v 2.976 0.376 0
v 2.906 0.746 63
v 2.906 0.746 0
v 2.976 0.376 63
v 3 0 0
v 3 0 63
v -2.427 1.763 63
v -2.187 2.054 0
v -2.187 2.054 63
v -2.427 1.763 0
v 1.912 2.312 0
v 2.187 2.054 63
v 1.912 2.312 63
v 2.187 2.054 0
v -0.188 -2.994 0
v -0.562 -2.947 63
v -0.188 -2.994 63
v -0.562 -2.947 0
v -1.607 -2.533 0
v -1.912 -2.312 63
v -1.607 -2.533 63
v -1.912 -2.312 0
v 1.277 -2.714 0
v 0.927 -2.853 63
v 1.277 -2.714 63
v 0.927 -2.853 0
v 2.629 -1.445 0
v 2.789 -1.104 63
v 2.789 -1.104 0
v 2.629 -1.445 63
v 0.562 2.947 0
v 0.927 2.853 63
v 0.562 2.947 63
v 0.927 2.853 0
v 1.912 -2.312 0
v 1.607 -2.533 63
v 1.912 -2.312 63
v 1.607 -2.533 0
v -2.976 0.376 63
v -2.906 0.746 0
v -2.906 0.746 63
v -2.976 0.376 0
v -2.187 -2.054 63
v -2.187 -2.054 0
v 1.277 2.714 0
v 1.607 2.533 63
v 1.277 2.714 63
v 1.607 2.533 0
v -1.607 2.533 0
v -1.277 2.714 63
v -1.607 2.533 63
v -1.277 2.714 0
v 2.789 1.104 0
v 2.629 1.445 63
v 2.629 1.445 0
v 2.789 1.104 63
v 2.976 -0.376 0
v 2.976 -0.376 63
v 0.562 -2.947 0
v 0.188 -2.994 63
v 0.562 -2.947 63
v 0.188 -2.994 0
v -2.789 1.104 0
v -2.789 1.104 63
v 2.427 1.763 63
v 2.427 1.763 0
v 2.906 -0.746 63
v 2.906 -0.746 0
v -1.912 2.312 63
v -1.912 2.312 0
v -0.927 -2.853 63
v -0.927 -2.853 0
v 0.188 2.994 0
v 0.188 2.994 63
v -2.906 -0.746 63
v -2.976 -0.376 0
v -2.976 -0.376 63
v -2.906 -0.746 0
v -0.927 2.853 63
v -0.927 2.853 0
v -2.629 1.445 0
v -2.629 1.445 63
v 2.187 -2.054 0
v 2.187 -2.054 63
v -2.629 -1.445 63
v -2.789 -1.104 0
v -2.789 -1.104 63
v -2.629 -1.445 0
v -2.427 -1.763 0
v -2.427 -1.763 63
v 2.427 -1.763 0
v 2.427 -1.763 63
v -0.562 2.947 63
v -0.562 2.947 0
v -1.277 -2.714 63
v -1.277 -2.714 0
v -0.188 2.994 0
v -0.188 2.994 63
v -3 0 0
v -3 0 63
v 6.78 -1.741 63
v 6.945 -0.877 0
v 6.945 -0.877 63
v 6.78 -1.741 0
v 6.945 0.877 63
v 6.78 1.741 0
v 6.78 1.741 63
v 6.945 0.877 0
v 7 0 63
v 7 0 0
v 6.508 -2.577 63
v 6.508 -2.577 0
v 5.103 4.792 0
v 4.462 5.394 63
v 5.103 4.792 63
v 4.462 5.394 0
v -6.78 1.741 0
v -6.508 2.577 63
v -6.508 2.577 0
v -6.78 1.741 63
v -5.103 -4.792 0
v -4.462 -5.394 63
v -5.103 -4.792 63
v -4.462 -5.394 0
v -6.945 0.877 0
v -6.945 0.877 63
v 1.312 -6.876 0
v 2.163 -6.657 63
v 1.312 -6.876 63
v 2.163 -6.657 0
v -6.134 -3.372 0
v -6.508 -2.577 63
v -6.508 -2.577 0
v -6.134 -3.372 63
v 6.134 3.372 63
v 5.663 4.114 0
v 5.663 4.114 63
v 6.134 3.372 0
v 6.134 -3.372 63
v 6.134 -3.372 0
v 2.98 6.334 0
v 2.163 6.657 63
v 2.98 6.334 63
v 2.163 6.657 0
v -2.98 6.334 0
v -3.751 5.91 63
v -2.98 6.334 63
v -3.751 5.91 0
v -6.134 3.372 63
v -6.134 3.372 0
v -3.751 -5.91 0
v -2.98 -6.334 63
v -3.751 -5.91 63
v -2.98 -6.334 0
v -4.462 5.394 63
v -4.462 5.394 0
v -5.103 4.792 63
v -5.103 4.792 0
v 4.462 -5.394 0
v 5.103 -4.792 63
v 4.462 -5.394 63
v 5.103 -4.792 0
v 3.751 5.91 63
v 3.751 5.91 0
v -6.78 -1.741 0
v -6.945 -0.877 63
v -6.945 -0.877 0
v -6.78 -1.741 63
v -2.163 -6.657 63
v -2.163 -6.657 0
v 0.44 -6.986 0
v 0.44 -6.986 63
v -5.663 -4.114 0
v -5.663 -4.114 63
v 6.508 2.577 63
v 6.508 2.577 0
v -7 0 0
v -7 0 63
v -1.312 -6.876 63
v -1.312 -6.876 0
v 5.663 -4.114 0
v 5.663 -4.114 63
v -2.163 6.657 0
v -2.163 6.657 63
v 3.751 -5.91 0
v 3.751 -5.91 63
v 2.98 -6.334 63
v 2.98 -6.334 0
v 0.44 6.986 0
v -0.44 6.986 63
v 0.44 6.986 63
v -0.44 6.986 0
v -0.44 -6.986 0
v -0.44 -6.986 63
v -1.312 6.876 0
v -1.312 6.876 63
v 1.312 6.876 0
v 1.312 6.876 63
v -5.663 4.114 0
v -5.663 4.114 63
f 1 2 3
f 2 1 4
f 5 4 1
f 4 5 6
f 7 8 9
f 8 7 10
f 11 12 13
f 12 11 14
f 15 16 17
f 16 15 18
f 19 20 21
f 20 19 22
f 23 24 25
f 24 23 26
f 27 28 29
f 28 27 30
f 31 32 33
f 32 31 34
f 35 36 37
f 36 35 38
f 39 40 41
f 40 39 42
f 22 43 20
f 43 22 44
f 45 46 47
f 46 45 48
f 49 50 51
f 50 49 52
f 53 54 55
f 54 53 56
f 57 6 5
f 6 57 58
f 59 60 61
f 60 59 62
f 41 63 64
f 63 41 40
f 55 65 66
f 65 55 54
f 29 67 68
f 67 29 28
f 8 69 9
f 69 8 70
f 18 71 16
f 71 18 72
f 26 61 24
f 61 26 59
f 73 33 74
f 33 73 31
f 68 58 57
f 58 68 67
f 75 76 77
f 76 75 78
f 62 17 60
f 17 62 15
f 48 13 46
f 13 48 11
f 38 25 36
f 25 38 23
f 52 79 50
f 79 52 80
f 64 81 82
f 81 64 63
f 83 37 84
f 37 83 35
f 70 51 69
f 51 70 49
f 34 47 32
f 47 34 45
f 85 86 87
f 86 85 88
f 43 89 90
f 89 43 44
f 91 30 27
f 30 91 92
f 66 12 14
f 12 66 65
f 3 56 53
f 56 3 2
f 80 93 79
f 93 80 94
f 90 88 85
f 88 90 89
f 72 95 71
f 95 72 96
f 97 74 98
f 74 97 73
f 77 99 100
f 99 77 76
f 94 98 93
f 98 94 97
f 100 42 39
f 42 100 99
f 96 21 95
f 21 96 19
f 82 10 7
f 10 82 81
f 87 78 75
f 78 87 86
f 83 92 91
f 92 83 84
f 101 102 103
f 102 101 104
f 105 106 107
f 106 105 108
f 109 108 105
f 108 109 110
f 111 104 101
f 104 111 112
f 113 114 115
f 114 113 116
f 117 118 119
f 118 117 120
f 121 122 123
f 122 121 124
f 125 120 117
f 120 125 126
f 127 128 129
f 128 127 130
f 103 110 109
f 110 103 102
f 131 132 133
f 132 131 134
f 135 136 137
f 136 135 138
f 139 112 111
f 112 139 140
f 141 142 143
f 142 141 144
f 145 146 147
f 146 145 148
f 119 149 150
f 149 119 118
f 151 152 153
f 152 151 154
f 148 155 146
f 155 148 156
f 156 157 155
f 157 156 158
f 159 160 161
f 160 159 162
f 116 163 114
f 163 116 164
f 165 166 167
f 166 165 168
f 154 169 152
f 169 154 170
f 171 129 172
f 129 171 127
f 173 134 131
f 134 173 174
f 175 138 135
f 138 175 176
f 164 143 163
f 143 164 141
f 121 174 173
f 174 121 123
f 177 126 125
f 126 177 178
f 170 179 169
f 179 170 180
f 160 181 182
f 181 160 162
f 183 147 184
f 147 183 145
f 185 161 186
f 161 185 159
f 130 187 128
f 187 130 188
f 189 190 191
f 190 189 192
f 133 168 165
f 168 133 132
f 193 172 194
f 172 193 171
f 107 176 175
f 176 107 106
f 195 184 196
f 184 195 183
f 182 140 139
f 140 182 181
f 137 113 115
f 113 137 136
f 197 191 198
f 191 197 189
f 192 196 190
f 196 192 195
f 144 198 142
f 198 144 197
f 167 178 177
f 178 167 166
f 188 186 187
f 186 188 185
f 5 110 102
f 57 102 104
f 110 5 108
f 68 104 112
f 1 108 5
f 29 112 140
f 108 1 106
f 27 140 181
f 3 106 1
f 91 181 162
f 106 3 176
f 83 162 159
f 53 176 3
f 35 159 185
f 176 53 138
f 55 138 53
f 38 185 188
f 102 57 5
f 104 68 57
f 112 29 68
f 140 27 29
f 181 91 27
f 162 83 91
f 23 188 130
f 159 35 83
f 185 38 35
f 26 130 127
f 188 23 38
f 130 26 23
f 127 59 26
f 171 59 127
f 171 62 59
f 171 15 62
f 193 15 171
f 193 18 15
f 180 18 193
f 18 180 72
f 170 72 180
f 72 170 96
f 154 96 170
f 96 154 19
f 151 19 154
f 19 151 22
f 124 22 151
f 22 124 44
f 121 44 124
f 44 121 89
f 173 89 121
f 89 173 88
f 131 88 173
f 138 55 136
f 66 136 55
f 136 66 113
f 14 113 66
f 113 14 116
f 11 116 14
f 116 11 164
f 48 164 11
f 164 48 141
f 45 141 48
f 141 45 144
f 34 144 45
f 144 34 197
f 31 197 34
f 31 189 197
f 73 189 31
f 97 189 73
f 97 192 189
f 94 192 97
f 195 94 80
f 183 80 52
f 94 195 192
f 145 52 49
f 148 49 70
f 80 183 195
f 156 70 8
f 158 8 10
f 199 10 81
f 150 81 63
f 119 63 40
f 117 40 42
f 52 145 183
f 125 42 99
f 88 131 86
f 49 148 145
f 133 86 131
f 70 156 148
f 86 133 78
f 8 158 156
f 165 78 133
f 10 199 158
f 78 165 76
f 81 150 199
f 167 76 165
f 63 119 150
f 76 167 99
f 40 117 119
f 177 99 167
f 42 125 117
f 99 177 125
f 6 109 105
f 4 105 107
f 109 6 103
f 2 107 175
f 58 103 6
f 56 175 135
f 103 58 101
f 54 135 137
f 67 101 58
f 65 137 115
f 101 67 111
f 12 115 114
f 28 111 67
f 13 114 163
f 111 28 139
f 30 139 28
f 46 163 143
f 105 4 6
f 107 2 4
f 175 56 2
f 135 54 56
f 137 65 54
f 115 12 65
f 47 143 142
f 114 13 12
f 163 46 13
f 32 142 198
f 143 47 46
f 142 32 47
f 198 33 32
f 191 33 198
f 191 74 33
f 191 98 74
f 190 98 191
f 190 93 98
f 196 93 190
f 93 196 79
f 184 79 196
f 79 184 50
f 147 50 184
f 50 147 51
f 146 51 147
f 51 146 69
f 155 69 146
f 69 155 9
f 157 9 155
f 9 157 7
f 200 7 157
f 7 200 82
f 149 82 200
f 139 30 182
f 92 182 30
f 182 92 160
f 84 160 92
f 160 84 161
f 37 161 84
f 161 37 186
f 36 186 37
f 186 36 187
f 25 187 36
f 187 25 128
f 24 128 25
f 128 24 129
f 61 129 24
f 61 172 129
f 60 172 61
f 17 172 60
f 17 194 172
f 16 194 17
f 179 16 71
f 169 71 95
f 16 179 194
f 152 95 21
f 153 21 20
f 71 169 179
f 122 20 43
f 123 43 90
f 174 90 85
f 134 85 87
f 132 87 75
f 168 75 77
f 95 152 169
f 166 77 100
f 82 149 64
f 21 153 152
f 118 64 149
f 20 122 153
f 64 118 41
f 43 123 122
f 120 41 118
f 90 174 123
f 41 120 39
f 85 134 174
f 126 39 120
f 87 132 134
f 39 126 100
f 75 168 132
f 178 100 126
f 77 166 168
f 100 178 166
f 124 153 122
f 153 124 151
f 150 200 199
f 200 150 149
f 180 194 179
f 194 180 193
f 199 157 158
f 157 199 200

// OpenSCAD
$fn = 50;


difference() {
	union() {
		cylinder(h = 63, r = 7.0000000000);
	}
	union() {
		translate(v = [0.0000000000, 0.0000000000, -100.0000000000]) {
			cylinder(h = 200, r = 3.0000000000);
		}
		cylinder(h = 63, r = 1.5000000000);
		cylinder(h = 63, r = 1.5000000000);
		cylinder(h = 63, r = 1.5000000000);
	}
}
